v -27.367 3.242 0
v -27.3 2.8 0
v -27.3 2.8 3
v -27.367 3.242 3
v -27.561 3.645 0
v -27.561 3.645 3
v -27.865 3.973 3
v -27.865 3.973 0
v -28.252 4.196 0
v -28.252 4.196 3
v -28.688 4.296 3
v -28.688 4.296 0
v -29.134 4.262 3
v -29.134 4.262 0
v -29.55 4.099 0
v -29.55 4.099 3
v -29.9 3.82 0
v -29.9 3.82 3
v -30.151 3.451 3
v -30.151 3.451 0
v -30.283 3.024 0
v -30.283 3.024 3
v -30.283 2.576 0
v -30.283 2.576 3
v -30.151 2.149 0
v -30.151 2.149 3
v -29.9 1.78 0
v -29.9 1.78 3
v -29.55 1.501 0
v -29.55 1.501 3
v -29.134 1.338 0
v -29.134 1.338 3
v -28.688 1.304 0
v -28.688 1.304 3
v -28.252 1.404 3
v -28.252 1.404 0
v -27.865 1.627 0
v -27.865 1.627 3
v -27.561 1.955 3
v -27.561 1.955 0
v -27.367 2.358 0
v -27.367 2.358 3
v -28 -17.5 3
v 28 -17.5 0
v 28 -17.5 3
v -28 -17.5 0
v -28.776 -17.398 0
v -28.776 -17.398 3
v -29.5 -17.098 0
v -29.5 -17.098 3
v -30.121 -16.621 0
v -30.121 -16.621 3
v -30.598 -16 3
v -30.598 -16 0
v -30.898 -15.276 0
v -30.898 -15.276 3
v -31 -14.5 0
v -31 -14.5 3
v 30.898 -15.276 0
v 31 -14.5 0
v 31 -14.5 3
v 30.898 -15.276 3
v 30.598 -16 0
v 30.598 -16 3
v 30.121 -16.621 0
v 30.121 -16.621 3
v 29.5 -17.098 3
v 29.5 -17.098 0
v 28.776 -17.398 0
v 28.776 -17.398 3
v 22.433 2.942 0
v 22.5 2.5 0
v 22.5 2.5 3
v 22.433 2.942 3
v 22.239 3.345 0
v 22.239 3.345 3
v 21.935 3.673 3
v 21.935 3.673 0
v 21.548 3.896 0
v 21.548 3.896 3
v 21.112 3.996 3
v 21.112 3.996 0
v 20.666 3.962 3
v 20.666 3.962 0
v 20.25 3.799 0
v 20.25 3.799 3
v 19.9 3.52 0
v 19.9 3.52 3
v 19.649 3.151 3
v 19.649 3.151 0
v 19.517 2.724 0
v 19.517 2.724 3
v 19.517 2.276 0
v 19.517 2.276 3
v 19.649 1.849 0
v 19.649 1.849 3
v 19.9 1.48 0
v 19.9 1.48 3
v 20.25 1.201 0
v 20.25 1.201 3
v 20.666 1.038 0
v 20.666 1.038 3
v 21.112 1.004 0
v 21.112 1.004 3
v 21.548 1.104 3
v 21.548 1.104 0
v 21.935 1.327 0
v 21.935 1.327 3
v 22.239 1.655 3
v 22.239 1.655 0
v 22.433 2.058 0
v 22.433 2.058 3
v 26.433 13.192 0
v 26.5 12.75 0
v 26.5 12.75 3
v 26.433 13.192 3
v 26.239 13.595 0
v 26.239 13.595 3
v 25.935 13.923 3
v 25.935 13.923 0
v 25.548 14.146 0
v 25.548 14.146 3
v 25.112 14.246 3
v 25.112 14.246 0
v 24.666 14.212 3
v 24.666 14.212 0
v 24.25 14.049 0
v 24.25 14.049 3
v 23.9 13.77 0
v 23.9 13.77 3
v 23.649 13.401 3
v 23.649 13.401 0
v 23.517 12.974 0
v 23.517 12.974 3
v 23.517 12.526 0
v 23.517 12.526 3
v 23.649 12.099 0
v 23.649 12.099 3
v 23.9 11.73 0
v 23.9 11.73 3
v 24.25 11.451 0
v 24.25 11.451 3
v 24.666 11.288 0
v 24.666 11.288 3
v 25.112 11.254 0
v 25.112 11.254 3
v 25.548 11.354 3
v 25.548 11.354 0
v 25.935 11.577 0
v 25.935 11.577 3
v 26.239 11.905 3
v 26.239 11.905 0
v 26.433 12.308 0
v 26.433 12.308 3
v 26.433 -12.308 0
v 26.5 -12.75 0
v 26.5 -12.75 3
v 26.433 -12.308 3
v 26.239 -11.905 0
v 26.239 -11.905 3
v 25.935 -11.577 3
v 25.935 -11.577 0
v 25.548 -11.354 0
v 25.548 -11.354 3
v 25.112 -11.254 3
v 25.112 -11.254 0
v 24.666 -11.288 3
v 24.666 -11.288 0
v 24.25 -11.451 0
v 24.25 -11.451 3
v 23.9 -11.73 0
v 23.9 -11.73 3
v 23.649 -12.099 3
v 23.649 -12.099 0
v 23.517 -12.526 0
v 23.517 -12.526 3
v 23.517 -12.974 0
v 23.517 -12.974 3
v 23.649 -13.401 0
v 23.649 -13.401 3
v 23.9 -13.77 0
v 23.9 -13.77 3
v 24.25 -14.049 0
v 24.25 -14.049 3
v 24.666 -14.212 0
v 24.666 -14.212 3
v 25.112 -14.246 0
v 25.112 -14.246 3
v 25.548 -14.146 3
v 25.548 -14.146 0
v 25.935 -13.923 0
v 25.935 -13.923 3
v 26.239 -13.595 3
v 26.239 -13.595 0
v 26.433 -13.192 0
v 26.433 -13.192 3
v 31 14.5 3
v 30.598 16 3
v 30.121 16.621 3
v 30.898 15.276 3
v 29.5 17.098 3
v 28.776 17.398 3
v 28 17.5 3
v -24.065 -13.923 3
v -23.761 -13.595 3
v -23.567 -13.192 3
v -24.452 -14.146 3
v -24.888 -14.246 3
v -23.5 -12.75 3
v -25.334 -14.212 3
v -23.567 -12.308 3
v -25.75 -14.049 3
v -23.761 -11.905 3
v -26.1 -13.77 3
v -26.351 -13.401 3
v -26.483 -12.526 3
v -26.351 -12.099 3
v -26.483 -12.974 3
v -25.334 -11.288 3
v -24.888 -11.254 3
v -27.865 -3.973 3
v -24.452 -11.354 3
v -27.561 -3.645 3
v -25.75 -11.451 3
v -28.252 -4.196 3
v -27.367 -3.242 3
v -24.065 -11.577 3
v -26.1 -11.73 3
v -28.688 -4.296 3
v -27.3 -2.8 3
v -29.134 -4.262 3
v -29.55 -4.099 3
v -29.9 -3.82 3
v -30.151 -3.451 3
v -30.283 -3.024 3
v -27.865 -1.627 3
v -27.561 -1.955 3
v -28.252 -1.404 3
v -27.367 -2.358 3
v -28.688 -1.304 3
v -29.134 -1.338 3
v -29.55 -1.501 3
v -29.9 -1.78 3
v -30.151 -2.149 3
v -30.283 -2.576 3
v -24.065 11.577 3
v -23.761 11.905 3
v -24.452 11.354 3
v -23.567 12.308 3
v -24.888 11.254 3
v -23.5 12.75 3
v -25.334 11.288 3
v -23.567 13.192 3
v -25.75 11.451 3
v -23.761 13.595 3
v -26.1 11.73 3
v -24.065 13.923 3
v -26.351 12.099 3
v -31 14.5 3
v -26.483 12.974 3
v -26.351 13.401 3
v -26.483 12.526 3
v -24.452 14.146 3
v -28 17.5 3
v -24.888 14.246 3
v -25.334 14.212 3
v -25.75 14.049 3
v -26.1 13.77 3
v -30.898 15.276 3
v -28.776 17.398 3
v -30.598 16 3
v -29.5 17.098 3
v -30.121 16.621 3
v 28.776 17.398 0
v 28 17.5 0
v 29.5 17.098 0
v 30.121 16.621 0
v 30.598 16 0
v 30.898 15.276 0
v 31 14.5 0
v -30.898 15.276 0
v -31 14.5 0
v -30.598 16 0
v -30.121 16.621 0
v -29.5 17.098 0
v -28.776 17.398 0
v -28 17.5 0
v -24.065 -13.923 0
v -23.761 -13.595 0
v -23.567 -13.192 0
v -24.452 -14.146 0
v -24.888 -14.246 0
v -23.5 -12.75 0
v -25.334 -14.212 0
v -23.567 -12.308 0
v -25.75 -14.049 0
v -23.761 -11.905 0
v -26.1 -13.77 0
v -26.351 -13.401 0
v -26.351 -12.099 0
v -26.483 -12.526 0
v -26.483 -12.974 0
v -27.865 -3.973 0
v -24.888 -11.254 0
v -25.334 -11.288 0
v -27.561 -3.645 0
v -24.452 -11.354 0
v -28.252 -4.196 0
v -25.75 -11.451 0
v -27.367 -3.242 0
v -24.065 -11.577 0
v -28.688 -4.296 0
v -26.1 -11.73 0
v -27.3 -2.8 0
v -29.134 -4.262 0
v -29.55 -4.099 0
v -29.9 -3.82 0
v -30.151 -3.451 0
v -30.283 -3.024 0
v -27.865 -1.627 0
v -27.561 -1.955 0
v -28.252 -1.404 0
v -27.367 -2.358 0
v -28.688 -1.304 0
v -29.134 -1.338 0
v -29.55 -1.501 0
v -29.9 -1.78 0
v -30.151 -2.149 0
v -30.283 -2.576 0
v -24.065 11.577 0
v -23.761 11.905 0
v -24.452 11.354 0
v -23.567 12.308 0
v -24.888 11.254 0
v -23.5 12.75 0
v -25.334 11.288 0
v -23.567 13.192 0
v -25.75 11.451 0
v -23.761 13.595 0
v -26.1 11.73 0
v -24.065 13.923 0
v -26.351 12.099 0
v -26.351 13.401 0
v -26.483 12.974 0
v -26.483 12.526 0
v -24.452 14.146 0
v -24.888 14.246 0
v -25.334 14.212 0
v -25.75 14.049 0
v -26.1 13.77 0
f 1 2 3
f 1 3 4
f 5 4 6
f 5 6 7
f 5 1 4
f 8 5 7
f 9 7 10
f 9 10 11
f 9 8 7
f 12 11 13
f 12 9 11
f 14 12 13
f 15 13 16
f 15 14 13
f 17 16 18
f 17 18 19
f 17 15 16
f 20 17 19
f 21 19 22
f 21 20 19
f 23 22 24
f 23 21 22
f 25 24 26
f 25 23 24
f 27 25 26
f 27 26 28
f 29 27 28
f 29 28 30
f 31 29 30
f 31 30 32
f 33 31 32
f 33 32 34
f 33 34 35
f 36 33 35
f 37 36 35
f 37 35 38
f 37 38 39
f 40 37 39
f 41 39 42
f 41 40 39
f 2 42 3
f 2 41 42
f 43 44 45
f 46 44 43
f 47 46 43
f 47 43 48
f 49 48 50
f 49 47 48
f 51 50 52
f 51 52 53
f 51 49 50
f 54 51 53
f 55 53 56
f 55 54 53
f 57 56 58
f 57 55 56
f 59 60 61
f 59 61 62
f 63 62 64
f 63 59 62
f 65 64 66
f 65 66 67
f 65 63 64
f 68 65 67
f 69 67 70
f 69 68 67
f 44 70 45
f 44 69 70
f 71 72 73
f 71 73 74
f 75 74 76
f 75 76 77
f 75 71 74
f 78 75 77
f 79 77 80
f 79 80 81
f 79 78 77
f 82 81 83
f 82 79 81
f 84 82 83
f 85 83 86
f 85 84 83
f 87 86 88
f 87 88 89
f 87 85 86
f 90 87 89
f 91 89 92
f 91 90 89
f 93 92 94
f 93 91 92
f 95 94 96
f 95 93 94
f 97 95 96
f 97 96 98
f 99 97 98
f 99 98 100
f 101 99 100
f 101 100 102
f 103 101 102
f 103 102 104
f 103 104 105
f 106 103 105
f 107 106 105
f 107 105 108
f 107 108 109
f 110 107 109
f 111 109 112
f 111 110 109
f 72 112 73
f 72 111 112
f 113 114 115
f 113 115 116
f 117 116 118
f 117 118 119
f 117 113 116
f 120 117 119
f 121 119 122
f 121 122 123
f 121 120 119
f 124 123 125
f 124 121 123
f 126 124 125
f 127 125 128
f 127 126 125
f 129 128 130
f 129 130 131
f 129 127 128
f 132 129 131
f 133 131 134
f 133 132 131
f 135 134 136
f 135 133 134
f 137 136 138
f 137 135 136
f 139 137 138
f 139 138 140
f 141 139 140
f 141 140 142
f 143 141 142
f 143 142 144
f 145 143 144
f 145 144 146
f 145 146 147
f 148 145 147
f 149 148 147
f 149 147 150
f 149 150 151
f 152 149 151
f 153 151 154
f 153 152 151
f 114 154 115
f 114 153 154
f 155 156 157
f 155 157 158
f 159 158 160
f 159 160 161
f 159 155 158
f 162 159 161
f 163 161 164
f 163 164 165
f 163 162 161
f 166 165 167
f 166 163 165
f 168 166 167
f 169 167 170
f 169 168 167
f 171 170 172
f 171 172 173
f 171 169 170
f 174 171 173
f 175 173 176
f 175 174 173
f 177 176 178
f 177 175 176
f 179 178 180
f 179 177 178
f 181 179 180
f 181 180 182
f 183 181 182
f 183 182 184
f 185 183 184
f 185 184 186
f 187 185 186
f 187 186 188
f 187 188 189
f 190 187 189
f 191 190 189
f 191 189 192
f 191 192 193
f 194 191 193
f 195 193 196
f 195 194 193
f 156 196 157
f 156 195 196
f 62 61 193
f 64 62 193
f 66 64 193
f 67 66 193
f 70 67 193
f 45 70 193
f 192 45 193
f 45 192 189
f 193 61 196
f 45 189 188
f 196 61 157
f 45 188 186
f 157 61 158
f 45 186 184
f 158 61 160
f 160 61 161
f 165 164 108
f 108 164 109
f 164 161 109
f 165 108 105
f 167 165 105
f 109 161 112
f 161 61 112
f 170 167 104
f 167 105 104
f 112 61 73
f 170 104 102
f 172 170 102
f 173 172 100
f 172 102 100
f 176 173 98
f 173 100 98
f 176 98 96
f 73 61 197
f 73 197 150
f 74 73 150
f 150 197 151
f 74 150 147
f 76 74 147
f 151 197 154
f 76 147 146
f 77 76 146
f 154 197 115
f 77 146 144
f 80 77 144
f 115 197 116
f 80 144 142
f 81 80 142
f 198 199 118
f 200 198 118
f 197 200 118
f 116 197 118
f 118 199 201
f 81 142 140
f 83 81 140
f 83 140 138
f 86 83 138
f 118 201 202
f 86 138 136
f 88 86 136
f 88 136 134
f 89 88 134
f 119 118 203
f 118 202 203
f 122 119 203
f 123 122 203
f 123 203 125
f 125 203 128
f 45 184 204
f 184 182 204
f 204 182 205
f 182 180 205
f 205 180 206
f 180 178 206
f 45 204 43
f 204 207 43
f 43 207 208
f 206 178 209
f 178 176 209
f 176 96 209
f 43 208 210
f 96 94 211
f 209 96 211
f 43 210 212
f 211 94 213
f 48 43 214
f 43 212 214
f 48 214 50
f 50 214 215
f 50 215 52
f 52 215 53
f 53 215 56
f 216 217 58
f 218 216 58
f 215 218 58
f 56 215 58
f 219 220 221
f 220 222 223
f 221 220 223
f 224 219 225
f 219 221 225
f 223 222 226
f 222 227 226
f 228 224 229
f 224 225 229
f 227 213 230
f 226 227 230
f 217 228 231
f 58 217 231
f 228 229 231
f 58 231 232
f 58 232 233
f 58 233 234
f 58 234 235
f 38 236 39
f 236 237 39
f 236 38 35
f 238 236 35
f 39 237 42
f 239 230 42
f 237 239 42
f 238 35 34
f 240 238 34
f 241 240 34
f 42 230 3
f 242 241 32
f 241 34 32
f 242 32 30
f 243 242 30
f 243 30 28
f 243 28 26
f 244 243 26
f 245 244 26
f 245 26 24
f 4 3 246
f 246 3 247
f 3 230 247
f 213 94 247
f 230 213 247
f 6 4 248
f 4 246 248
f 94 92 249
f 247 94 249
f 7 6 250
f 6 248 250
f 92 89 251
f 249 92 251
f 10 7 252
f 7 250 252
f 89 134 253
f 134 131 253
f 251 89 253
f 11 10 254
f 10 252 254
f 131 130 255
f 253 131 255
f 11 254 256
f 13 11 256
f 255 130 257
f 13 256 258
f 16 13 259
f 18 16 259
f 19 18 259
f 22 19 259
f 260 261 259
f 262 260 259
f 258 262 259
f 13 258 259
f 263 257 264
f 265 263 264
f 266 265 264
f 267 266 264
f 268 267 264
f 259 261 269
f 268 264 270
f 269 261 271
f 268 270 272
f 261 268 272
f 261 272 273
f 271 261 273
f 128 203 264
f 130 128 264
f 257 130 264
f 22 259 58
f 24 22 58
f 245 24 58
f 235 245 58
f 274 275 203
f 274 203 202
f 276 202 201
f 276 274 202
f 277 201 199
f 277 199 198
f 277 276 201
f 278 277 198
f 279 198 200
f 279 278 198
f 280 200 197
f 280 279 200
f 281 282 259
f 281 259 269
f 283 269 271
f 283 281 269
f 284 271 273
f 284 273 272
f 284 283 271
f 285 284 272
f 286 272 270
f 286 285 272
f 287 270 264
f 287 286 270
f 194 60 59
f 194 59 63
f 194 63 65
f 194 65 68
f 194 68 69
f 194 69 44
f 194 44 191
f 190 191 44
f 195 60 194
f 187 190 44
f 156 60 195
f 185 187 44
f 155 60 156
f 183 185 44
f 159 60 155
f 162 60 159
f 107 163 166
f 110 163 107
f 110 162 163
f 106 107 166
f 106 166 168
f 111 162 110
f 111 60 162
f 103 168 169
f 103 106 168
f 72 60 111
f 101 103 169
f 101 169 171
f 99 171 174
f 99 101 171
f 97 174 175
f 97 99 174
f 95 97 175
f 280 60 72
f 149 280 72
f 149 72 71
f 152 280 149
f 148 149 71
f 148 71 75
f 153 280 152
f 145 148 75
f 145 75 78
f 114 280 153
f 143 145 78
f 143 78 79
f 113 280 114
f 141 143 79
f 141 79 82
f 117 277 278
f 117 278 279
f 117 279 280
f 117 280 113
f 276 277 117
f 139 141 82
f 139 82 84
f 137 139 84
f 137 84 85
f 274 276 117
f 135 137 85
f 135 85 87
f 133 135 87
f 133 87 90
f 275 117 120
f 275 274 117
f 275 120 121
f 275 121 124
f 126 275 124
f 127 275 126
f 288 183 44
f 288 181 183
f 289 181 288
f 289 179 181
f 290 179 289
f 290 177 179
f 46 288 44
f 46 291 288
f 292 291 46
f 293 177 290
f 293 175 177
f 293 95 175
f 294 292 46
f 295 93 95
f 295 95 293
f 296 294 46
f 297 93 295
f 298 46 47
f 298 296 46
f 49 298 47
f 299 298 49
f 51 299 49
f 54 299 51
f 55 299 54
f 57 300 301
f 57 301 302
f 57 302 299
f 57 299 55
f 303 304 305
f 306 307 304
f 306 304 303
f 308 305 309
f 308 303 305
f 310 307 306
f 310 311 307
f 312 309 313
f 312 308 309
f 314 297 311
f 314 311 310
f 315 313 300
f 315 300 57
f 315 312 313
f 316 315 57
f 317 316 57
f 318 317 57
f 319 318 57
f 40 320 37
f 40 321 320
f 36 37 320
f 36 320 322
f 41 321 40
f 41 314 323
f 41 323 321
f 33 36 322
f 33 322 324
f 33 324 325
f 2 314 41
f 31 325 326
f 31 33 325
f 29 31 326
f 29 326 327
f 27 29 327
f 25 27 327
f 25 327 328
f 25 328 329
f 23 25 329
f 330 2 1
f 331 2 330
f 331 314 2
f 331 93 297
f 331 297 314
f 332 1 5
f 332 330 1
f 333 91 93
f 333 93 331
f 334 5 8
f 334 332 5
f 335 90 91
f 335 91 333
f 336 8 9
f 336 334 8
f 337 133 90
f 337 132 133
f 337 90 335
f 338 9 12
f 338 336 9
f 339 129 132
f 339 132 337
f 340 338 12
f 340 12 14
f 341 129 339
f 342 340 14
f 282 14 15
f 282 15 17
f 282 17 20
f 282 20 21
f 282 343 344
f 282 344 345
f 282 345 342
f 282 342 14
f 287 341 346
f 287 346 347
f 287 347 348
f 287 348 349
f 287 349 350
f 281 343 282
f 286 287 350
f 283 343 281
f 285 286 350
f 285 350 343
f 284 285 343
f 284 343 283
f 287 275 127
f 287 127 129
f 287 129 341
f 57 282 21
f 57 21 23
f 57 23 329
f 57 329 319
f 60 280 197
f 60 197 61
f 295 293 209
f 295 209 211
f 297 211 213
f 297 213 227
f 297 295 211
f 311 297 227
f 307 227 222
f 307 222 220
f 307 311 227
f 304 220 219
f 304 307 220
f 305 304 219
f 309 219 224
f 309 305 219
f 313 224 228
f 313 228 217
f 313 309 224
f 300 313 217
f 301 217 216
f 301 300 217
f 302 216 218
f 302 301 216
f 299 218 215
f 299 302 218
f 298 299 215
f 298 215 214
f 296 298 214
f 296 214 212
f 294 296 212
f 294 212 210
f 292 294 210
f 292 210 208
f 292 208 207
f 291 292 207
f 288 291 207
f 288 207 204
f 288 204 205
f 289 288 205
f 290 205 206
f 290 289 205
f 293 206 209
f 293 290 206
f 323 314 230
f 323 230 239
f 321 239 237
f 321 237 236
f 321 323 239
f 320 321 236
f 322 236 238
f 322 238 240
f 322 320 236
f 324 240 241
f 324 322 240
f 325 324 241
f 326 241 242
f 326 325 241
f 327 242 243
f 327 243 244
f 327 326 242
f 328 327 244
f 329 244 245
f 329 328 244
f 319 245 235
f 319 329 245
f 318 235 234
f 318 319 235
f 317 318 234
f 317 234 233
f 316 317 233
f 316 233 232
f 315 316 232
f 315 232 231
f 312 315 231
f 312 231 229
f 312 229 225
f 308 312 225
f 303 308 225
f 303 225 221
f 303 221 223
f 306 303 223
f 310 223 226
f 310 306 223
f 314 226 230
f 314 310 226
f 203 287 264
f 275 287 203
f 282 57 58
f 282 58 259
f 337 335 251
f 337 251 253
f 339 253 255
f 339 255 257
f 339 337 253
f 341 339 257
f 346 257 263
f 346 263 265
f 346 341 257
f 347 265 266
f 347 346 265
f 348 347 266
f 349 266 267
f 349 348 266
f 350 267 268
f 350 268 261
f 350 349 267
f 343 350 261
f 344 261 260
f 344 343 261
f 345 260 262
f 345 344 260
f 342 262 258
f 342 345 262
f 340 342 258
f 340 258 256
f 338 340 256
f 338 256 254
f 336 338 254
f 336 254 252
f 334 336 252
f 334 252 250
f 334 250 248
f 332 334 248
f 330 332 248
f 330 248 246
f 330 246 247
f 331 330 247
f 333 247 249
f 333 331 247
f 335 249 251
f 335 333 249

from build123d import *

# Parameters (mm, degrees)
SKETCH1_R           = 1.5
BOSS_EXTRUDE1_DEPTH = 3


with BuildPart() as part:
    # Sketch1 → Boss-Extrude1 (new body)
    with BuildSketch(Plane.XY):
        with BuildLine():
            Line((-28, 17.5), (28, 17.5))
            ThreePointArc((28, 17.5), (30.121320344, 16.621320344), (31, 14.5))
            Line((31, 14.5), (31, -14.5))
            ThreePointArc((31, -14.5), (30.121320344, -16.621320344), (28, -17.5))
            Line((28, -17.5), (-28, -17.5))
            ThreePointArc((-28, -17.5), (-30.121320344, -16.621320344), (-31, -14.5))
            Line((-31, -14.5), (-31, 14.5))
            ThreePointArc((-31, 14.5), (-30.121320344, 16.621320344), (-28, 17.5))
        make_face()
        with Locations((-28.8, 2.8)):
            Circle(SKETCH1_R, mode=Mode.SUBTRACT)
        with Locations((-28.8, -2.8)):
            Circle(SKETCH1_R, mode=Mode.SUBTRACT)
        with Locations((21, 2.5)):
            Circle(SKETCH1_R, mode=Mode.SUBTRACT)
        with Locations((-25, 12.75)):
            Circle(SKETCH1_R, mode=Mode.SUBTRACT)
        with Locations((25, 12.75)):
            Circle(SKETCH1_R, mode=Mode.SUBTRACT)
        with Locations((25, -12.75)):
            Circle(SKETCH1_R, mode=Mode.SUBTRACT)
        with Locations((-25, -12.75)):
            Circle(SKETCH1_R, mode=Mode.SUBTRACT)
    extrude(amount=BOSS_EXTRUDE1_DEPTH)


solid = part.part
